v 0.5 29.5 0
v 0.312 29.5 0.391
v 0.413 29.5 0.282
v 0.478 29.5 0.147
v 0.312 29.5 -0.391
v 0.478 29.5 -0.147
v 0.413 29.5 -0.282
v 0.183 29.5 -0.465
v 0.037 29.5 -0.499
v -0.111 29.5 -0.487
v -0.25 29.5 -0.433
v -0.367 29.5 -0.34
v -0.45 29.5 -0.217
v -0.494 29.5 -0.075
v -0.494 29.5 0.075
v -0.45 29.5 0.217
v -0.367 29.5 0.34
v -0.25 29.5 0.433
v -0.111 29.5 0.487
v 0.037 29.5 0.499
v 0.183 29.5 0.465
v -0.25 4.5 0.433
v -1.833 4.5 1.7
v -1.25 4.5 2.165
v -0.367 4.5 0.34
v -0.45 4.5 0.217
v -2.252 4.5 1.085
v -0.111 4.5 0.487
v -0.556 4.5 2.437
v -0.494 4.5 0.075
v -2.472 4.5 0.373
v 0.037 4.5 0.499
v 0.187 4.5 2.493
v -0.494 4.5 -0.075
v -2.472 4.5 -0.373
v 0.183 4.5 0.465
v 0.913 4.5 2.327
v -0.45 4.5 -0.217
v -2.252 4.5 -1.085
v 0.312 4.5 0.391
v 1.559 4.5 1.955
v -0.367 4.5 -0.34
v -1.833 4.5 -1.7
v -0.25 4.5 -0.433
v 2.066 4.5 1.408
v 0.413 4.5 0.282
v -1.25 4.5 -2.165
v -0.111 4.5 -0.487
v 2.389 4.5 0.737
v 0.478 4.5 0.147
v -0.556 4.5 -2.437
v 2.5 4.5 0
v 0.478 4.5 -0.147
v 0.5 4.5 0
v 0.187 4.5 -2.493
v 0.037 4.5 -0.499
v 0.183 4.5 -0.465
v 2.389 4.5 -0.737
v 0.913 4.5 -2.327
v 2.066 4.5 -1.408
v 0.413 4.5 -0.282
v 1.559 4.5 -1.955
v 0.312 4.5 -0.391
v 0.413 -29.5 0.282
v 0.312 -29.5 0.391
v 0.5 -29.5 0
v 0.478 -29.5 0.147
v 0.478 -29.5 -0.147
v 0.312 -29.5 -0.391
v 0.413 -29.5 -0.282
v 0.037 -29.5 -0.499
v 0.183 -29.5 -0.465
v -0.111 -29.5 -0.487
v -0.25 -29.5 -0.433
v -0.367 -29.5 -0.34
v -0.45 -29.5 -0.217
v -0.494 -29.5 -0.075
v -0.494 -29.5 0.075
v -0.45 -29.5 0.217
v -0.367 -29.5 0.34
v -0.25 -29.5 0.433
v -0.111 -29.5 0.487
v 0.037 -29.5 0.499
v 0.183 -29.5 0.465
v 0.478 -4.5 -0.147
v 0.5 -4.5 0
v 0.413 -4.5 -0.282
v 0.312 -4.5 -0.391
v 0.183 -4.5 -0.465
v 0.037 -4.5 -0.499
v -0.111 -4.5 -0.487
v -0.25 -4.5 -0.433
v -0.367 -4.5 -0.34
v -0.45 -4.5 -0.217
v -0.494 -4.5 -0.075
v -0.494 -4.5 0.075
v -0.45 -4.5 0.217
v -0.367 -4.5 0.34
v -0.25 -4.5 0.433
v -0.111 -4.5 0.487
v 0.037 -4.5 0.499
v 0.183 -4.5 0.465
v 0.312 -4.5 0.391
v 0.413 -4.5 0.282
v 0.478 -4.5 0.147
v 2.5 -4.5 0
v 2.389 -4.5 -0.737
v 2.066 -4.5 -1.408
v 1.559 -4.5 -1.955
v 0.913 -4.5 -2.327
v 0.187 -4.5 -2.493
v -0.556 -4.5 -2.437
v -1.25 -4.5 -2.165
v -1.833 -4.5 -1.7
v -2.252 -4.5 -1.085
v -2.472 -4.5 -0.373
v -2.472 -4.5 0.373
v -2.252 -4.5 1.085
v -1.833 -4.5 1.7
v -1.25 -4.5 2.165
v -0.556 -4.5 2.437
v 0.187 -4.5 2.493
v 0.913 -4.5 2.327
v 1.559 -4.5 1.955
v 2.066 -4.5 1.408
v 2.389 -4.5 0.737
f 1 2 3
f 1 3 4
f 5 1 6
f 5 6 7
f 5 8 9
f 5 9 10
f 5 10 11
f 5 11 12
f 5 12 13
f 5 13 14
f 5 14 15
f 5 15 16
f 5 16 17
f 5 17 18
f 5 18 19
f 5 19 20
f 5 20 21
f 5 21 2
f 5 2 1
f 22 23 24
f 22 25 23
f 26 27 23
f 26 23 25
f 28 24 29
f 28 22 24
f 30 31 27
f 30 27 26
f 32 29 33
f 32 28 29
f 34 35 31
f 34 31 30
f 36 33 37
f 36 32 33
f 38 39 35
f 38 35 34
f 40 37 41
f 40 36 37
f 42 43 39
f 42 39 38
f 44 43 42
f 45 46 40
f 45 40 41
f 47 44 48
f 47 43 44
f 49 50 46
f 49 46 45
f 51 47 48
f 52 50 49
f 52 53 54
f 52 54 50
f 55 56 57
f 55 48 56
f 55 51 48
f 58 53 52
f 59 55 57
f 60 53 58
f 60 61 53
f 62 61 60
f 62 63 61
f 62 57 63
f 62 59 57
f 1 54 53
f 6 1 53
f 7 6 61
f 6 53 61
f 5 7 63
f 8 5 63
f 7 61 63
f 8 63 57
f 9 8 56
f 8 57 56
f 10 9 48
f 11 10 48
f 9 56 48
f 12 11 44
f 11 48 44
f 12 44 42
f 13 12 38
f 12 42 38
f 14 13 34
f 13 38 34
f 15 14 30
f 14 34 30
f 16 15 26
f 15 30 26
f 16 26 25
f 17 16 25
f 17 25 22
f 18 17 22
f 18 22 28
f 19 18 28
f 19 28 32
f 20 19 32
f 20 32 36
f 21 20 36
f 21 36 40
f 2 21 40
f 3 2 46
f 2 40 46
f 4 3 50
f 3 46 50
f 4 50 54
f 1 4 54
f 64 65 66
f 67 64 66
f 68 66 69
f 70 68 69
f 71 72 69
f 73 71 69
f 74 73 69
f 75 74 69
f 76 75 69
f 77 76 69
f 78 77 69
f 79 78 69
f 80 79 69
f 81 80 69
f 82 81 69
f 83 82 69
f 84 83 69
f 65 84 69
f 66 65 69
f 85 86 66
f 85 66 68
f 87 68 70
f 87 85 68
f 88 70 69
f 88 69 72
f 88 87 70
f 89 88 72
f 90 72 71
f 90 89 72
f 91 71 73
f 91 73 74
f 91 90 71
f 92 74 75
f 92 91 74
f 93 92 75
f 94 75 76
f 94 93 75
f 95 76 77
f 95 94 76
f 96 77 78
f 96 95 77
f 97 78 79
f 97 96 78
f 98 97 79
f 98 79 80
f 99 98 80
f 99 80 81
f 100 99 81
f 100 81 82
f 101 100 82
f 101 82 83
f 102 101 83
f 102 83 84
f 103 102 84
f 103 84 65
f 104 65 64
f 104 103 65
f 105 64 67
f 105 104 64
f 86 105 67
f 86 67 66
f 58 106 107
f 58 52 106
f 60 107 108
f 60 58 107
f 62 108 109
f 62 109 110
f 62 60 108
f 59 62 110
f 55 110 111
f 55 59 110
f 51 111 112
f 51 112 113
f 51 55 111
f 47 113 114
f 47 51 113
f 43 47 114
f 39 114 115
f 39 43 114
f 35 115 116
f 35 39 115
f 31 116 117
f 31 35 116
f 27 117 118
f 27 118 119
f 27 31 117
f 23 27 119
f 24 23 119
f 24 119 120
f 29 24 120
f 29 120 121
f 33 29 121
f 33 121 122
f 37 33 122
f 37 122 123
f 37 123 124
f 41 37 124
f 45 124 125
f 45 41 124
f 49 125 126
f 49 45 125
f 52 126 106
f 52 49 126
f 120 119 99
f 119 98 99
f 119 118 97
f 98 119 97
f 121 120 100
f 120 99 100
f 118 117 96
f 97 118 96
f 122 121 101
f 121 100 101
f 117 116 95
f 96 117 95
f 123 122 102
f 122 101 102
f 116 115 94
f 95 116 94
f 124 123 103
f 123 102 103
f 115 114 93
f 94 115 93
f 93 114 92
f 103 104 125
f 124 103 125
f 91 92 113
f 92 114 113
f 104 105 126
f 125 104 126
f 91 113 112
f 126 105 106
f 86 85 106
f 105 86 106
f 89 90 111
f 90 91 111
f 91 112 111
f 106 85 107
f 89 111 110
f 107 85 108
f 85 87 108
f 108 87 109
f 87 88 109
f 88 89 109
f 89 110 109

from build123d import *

# Parameters (mm, degrees)
SKETCH1_R           = 2.5
BOSS_EXTRUDE1_DEPTH = 4.5
SKETCH2_R           = 0.5
BOSS_EXTRUDE2_DEPTH = 25


with BuildPart() as part:
    # Sketch1 → Boss-Extrude1 (new body, symmetric)
    with BuildSketch(Plane(origin=(0, 0, 0), x_dir=(1, 0, 0), z_dir=(0, 1, 0))):
        Circle(SKETCH1_R)
    extrude(amount=BOSS_EXTRUDE1_DEPTH, both=True)

    # Sketch2 → Boss-Extrude2 (add)
    with BuildSketch(Plane(origin=(0, 4.5, 0), x_dir=(1, 0, 0), z_dir=(0, 1, 0))):
        Circle(SKETCH2_R)
    boss_extrude2 = extrude(amount=BOSS_EXTRUDE2_DEPTH)

    # Mirror4: Boss-Extrude2 across plane
    add(boss_extrude2.mirror(Plane.ZX))


solid = part.part
